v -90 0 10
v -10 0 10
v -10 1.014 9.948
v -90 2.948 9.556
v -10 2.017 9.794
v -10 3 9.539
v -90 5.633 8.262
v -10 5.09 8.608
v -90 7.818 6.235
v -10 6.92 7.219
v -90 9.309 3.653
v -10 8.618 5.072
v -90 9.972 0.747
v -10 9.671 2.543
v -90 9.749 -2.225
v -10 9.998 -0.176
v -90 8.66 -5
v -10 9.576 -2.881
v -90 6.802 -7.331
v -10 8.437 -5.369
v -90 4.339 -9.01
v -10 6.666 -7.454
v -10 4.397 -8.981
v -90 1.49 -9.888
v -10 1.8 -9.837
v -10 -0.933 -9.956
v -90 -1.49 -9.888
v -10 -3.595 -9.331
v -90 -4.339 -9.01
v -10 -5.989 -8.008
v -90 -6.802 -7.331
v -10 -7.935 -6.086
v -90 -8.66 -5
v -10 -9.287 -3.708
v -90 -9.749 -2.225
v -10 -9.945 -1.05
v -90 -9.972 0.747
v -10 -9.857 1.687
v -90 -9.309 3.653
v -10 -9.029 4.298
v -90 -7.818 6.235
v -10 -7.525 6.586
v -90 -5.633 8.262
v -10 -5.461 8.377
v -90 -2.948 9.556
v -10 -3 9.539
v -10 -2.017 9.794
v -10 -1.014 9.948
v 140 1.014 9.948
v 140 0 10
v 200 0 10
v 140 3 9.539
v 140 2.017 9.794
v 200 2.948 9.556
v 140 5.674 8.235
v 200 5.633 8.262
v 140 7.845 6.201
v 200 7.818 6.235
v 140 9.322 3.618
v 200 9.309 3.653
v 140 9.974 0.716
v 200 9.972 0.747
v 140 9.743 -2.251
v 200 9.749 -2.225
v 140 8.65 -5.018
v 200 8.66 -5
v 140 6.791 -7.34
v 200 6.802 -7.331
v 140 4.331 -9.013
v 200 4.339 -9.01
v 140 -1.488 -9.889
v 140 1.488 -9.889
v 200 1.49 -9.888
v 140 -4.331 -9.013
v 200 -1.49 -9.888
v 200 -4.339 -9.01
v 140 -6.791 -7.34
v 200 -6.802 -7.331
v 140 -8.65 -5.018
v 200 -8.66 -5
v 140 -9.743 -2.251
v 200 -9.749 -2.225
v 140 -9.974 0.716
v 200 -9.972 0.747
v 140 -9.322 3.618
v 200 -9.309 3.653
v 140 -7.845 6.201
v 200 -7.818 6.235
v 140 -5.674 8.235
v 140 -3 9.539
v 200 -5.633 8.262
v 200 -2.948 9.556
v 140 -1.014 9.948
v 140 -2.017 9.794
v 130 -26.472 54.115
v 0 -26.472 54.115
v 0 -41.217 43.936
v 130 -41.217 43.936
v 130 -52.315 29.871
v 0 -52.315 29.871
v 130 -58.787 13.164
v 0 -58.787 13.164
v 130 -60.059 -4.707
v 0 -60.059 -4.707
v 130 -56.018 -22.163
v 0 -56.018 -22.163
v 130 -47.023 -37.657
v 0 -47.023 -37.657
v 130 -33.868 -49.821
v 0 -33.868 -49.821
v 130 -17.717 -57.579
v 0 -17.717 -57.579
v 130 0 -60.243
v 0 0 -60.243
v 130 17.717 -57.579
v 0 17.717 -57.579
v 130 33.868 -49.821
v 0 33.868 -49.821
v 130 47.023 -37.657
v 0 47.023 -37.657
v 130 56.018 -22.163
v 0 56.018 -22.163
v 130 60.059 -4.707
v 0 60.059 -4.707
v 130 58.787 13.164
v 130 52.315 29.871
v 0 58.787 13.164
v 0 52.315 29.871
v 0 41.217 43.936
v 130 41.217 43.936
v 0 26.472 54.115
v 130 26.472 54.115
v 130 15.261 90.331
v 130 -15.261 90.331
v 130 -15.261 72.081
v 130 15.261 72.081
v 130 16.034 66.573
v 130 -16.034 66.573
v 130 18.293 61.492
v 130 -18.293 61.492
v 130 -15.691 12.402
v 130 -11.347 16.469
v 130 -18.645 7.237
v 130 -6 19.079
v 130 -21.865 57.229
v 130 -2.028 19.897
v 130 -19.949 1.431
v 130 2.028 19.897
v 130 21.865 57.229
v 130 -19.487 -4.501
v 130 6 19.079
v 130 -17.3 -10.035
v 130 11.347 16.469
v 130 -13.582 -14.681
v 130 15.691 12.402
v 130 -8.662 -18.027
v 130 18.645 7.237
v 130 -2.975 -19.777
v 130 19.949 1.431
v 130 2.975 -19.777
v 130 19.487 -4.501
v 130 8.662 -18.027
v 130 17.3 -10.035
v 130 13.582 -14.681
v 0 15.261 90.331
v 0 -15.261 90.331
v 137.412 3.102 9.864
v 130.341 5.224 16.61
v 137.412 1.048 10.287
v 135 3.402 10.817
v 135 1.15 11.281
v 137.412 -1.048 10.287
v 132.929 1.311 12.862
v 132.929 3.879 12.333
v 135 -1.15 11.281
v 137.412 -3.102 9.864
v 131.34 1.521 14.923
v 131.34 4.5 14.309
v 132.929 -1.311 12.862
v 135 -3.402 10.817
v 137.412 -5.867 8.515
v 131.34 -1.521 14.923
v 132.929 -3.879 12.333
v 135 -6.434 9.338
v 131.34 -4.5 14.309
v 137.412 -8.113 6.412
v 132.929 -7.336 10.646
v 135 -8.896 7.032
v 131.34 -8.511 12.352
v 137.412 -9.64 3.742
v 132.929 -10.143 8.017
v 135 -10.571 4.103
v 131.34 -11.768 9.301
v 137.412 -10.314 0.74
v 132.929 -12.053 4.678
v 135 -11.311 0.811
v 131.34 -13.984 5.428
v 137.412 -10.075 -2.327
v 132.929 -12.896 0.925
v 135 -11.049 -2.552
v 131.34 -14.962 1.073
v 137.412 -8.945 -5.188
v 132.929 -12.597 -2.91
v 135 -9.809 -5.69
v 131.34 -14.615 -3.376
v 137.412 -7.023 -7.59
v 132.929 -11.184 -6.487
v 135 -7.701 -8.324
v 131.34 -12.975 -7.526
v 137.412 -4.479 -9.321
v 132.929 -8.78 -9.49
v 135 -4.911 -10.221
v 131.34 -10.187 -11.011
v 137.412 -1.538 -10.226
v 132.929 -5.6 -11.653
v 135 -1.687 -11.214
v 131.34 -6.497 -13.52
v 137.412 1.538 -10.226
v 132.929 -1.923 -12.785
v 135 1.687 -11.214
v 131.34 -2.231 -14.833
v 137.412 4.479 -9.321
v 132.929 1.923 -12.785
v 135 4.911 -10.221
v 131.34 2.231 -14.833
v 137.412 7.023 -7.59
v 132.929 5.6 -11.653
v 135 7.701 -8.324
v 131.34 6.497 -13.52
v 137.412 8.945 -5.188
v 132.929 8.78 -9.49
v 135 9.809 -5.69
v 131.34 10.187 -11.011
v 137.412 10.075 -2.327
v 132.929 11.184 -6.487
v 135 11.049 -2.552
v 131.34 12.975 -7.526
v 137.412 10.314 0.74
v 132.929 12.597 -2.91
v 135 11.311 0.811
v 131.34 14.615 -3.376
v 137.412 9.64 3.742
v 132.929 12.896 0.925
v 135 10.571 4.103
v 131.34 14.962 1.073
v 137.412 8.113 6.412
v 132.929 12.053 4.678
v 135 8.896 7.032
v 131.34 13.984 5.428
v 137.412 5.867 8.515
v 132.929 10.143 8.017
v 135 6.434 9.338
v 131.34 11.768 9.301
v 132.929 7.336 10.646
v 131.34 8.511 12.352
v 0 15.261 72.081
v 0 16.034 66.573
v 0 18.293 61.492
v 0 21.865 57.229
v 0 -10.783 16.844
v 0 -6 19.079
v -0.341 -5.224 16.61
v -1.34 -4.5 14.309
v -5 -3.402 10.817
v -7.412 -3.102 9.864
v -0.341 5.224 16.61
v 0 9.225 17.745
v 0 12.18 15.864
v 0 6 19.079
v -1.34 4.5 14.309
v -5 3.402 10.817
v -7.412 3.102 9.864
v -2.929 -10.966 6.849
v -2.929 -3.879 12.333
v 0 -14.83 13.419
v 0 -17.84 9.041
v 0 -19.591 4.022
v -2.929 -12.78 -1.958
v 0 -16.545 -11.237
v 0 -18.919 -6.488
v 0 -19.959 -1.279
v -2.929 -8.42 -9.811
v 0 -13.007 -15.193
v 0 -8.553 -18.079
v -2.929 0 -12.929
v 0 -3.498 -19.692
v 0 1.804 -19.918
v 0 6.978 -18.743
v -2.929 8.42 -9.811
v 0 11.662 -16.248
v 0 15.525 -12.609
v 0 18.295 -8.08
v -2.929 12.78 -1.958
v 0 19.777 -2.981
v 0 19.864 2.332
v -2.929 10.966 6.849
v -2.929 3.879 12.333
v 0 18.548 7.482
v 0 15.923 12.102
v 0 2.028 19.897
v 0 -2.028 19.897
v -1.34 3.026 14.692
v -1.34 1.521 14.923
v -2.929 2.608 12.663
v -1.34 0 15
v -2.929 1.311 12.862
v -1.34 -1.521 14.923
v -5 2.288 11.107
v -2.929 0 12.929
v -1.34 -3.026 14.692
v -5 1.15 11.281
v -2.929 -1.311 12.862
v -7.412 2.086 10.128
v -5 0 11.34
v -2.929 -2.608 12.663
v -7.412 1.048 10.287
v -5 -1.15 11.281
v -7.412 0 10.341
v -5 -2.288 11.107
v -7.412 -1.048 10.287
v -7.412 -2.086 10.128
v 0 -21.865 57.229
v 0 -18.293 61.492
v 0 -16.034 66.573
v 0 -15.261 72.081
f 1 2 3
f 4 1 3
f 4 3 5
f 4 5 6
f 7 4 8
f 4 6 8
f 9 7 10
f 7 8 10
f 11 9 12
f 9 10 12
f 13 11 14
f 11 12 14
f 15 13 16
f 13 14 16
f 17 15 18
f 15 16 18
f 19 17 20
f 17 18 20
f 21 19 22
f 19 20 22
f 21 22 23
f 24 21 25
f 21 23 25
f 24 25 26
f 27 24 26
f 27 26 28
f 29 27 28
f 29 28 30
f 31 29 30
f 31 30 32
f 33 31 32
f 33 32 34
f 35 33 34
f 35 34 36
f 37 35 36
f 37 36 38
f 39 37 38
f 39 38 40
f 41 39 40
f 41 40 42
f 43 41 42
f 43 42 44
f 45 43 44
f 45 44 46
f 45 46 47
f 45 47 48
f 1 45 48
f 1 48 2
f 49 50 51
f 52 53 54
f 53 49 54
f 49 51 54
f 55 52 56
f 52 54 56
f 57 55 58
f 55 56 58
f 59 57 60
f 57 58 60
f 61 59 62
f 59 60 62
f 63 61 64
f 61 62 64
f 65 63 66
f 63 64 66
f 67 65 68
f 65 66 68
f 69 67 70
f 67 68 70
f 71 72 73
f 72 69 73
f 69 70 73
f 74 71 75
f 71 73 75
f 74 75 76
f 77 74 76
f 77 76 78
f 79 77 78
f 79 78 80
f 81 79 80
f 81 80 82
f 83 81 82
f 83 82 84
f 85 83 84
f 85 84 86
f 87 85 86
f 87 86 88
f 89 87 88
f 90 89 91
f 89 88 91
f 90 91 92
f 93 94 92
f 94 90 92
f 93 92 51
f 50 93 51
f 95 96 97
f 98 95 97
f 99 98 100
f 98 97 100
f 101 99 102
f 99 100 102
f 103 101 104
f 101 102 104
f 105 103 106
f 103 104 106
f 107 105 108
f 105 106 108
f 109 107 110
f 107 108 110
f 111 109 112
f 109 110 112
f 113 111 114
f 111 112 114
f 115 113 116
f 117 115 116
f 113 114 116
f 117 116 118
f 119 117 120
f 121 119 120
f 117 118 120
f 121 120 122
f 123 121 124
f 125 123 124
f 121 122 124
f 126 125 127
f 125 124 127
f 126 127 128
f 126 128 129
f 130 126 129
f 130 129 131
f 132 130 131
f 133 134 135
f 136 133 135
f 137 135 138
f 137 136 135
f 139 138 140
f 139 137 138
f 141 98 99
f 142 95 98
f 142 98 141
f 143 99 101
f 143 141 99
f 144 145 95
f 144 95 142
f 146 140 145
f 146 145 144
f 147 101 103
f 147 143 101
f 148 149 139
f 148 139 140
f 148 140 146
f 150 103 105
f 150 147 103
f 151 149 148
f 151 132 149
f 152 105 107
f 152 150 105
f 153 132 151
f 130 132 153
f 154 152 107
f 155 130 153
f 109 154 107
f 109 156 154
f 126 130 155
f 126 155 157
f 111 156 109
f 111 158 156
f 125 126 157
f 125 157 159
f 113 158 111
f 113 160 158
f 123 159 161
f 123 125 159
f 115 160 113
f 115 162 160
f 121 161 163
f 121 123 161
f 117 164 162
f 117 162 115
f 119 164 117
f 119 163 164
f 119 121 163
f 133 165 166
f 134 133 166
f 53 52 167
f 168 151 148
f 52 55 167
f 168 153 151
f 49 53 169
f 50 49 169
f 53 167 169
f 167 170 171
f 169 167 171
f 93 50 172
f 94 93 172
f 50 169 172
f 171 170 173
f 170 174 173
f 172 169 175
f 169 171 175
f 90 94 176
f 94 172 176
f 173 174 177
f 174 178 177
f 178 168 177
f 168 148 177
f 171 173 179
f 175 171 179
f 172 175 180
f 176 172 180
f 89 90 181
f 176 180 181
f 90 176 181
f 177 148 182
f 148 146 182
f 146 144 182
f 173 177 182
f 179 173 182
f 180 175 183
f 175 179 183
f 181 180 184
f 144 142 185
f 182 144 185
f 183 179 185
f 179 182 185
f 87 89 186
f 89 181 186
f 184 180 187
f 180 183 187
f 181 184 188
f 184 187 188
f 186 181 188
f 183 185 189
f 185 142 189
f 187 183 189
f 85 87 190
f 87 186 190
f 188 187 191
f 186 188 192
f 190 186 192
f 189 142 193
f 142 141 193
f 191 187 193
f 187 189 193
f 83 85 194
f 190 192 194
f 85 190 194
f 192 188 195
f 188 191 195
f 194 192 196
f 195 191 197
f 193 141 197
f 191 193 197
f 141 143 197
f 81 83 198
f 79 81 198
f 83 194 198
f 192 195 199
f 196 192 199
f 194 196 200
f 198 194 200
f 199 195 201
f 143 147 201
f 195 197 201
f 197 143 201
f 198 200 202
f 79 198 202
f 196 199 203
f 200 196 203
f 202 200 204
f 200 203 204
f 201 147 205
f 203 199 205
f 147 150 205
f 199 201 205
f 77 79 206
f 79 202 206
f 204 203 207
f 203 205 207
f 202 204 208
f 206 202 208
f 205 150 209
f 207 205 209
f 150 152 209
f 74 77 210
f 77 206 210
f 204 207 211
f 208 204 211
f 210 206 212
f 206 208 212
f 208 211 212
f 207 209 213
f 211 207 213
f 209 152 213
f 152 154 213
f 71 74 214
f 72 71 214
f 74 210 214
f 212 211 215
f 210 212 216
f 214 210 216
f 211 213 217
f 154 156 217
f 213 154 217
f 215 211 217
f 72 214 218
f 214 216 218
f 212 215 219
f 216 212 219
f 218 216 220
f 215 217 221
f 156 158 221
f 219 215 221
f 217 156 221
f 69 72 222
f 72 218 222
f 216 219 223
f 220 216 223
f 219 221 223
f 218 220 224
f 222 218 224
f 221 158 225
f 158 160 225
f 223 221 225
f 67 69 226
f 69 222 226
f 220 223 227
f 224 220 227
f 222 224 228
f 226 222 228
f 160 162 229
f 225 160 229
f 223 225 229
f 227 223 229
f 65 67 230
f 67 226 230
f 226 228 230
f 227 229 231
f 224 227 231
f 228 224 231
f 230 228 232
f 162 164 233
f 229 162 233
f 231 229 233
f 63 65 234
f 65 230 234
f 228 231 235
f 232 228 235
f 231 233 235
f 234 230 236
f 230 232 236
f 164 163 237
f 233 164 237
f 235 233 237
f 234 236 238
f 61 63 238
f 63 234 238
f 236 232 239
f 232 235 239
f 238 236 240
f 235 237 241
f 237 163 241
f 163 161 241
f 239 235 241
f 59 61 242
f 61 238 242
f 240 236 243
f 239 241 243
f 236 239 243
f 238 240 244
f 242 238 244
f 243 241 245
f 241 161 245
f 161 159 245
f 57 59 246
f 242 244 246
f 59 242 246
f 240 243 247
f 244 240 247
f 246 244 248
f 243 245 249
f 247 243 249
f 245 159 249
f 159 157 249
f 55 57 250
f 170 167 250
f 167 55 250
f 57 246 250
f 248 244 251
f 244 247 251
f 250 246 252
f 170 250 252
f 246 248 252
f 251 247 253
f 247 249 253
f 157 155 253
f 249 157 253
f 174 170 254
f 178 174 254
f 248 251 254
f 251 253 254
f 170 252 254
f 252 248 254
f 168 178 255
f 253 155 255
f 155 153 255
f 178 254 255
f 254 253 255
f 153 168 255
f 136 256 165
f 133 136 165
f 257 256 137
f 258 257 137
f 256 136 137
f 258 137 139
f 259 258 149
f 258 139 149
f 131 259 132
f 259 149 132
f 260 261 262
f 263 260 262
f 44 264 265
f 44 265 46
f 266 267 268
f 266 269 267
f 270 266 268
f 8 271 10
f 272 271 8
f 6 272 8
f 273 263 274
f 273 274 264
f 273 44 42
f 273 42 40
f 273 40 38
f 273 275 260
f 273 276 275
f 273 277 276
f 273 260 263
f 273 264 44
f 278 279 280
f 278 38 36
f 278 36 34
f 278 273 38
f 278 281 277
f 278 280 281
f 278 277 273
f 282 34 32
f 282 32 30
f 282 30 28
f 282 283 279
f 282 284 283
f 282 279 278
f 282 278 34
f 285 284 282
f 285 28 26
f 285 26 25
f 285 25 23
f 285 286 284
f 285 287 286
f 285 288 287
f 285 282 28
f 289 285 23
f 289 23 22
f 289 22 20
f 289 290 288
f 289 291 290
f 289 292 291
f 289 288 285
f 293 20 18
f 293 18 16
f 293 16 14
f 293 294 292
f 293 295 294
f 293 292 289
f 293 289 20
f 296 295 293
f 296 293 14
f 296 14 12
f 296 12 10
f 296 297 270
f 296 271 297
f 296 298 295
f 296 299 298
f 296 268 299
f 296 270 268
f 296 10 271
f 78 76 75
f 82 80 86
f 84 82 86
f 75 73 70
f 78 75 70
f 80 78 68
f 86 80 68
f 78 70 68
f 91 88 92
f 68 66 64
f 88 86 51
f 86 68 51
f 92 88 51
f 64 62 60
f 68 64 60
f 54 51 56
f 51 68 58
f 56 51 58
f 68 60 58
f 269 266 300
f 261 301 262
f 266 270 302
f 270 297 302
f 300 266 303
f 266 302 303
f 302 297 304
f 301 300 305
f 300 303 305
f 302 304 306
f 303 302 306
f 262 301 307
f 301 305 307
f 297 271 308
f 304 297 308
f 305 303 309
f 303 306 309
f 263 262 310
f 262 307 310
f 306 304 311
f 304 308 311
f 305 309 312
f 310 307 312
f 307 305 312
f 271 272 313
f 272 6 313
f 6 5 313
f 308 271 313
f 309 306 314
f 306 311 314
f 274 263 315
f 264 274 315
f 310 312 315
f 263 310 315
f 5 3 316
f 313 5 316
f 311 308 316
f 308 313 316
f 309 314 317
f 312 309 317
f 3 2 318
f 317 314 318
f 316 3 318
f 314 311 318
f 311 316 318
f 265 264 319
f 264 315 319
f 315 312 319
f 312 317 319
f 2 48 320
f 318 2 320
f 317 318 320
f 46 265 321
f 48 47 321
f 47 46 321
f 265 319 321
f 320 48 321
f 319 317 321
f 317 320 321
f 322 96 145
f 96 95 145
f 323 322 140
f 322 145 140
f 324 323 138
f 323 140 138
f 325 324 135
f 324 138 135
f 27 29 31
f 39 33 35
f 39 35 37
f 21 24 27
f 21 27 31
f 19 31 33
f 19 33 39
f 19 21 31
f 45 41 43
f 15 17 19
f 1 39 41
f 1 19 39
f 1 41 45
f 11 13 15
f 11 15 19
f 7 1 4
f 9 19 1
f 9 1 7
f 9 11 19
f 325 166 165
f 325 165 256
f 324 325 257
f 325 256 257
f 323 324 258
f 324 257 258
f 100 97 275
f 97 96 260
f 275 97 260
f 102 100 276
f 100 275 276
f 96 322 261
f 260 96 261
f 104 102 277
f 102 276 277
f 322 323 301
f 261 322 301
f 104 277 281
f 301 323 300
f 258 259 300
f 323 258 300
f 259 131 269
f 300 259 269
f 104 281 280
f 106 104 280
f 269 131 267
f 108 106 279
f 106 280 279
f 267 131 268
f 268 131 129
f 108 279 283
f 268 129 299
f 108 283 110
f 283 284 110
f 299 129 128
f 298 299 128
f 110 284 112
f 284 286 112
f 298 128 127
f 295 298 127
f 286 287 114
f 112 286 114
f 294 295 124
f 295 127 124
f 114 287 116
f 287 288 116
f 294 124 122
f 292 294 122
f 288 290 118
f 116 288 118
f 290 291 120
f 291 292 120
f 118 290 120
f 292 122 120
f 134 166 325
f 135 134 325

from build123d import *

# Parameters (mm, degrees)
BOSS_EXTRUDE1_DEPTH      = 130
FILLET1_R                = 20
BOSS_EXTRUDE2_DEPTH      = 90
BOSS_EXTRUDE2_DEPTH_BACK = 200
SKETCH2_R                = 10
FILLET2_R                = 10


with BuildPart() as part:
    # Sketch1 → Boss-Extrude1 (new body)
    with BuildSketch(Plane(origin=(0, 0, 0), x_dir=(0, 0, -1), z_dir=(1, 0, 0))):
        with BuildLine():
            Line((-58.27789047, 15.260561771), (-90.331379838, 15.260561771))
            Line((-90.331379838, 15.260561771), (-90.331379838, -15.260561771))
            Line((-90.331379838, -15.260561771), (-58.27789047, -15.260561771))
            ThreePointArc((-58.27789047, -15.260561771), (60.242819184, 0), (-58.27789047, 15.260561771))
        make_face()
        with BuildLine():
            ThreePointArc((-9.539392014, -3), (10, 0), (-9.539392014, 3))
            ThreePointArc((-9.539392014, 3), (-10, 0), (-9.539392014, -3))
        make_face(mode=Mode.SUBTRACT)
    extrude(amount=BOSS_EXTRUDE1_DEPTH)

    # Fillet1
    fillet1_edges = [part.edges().sort_by_distance(p)[0] for p in [
        (65, -15.260561771, 58.27789047),
        (65, 15.260561771, 58.27789047),
    ]]
    fillet(fillet1_edges, radius=FILLET1_R)

    # Sketch2 → Boss-Extrude2 (add, two sides: drawn at the far end of the back side and taken through both)
    with BuildSketch(Plane.ZY.offset(-BOSS_EXTRUDE2_DEPTH_BACK)):
        Circle(SKETCH2_R)
    extrude(amount=BOSS_EXTRUDE2_DEPTH + BOSS_EXTRUDE2_DEPTH_BACK)

    # Fillet2
    fillet2_edges = [part.edges().sort_by_distance(p)[0] for p in [
        (130, 0, -10),
        (0, 0, -10),
    ]]
    fillet(fillet2_edges, radius=FILLET2_R)


solid = part.part
